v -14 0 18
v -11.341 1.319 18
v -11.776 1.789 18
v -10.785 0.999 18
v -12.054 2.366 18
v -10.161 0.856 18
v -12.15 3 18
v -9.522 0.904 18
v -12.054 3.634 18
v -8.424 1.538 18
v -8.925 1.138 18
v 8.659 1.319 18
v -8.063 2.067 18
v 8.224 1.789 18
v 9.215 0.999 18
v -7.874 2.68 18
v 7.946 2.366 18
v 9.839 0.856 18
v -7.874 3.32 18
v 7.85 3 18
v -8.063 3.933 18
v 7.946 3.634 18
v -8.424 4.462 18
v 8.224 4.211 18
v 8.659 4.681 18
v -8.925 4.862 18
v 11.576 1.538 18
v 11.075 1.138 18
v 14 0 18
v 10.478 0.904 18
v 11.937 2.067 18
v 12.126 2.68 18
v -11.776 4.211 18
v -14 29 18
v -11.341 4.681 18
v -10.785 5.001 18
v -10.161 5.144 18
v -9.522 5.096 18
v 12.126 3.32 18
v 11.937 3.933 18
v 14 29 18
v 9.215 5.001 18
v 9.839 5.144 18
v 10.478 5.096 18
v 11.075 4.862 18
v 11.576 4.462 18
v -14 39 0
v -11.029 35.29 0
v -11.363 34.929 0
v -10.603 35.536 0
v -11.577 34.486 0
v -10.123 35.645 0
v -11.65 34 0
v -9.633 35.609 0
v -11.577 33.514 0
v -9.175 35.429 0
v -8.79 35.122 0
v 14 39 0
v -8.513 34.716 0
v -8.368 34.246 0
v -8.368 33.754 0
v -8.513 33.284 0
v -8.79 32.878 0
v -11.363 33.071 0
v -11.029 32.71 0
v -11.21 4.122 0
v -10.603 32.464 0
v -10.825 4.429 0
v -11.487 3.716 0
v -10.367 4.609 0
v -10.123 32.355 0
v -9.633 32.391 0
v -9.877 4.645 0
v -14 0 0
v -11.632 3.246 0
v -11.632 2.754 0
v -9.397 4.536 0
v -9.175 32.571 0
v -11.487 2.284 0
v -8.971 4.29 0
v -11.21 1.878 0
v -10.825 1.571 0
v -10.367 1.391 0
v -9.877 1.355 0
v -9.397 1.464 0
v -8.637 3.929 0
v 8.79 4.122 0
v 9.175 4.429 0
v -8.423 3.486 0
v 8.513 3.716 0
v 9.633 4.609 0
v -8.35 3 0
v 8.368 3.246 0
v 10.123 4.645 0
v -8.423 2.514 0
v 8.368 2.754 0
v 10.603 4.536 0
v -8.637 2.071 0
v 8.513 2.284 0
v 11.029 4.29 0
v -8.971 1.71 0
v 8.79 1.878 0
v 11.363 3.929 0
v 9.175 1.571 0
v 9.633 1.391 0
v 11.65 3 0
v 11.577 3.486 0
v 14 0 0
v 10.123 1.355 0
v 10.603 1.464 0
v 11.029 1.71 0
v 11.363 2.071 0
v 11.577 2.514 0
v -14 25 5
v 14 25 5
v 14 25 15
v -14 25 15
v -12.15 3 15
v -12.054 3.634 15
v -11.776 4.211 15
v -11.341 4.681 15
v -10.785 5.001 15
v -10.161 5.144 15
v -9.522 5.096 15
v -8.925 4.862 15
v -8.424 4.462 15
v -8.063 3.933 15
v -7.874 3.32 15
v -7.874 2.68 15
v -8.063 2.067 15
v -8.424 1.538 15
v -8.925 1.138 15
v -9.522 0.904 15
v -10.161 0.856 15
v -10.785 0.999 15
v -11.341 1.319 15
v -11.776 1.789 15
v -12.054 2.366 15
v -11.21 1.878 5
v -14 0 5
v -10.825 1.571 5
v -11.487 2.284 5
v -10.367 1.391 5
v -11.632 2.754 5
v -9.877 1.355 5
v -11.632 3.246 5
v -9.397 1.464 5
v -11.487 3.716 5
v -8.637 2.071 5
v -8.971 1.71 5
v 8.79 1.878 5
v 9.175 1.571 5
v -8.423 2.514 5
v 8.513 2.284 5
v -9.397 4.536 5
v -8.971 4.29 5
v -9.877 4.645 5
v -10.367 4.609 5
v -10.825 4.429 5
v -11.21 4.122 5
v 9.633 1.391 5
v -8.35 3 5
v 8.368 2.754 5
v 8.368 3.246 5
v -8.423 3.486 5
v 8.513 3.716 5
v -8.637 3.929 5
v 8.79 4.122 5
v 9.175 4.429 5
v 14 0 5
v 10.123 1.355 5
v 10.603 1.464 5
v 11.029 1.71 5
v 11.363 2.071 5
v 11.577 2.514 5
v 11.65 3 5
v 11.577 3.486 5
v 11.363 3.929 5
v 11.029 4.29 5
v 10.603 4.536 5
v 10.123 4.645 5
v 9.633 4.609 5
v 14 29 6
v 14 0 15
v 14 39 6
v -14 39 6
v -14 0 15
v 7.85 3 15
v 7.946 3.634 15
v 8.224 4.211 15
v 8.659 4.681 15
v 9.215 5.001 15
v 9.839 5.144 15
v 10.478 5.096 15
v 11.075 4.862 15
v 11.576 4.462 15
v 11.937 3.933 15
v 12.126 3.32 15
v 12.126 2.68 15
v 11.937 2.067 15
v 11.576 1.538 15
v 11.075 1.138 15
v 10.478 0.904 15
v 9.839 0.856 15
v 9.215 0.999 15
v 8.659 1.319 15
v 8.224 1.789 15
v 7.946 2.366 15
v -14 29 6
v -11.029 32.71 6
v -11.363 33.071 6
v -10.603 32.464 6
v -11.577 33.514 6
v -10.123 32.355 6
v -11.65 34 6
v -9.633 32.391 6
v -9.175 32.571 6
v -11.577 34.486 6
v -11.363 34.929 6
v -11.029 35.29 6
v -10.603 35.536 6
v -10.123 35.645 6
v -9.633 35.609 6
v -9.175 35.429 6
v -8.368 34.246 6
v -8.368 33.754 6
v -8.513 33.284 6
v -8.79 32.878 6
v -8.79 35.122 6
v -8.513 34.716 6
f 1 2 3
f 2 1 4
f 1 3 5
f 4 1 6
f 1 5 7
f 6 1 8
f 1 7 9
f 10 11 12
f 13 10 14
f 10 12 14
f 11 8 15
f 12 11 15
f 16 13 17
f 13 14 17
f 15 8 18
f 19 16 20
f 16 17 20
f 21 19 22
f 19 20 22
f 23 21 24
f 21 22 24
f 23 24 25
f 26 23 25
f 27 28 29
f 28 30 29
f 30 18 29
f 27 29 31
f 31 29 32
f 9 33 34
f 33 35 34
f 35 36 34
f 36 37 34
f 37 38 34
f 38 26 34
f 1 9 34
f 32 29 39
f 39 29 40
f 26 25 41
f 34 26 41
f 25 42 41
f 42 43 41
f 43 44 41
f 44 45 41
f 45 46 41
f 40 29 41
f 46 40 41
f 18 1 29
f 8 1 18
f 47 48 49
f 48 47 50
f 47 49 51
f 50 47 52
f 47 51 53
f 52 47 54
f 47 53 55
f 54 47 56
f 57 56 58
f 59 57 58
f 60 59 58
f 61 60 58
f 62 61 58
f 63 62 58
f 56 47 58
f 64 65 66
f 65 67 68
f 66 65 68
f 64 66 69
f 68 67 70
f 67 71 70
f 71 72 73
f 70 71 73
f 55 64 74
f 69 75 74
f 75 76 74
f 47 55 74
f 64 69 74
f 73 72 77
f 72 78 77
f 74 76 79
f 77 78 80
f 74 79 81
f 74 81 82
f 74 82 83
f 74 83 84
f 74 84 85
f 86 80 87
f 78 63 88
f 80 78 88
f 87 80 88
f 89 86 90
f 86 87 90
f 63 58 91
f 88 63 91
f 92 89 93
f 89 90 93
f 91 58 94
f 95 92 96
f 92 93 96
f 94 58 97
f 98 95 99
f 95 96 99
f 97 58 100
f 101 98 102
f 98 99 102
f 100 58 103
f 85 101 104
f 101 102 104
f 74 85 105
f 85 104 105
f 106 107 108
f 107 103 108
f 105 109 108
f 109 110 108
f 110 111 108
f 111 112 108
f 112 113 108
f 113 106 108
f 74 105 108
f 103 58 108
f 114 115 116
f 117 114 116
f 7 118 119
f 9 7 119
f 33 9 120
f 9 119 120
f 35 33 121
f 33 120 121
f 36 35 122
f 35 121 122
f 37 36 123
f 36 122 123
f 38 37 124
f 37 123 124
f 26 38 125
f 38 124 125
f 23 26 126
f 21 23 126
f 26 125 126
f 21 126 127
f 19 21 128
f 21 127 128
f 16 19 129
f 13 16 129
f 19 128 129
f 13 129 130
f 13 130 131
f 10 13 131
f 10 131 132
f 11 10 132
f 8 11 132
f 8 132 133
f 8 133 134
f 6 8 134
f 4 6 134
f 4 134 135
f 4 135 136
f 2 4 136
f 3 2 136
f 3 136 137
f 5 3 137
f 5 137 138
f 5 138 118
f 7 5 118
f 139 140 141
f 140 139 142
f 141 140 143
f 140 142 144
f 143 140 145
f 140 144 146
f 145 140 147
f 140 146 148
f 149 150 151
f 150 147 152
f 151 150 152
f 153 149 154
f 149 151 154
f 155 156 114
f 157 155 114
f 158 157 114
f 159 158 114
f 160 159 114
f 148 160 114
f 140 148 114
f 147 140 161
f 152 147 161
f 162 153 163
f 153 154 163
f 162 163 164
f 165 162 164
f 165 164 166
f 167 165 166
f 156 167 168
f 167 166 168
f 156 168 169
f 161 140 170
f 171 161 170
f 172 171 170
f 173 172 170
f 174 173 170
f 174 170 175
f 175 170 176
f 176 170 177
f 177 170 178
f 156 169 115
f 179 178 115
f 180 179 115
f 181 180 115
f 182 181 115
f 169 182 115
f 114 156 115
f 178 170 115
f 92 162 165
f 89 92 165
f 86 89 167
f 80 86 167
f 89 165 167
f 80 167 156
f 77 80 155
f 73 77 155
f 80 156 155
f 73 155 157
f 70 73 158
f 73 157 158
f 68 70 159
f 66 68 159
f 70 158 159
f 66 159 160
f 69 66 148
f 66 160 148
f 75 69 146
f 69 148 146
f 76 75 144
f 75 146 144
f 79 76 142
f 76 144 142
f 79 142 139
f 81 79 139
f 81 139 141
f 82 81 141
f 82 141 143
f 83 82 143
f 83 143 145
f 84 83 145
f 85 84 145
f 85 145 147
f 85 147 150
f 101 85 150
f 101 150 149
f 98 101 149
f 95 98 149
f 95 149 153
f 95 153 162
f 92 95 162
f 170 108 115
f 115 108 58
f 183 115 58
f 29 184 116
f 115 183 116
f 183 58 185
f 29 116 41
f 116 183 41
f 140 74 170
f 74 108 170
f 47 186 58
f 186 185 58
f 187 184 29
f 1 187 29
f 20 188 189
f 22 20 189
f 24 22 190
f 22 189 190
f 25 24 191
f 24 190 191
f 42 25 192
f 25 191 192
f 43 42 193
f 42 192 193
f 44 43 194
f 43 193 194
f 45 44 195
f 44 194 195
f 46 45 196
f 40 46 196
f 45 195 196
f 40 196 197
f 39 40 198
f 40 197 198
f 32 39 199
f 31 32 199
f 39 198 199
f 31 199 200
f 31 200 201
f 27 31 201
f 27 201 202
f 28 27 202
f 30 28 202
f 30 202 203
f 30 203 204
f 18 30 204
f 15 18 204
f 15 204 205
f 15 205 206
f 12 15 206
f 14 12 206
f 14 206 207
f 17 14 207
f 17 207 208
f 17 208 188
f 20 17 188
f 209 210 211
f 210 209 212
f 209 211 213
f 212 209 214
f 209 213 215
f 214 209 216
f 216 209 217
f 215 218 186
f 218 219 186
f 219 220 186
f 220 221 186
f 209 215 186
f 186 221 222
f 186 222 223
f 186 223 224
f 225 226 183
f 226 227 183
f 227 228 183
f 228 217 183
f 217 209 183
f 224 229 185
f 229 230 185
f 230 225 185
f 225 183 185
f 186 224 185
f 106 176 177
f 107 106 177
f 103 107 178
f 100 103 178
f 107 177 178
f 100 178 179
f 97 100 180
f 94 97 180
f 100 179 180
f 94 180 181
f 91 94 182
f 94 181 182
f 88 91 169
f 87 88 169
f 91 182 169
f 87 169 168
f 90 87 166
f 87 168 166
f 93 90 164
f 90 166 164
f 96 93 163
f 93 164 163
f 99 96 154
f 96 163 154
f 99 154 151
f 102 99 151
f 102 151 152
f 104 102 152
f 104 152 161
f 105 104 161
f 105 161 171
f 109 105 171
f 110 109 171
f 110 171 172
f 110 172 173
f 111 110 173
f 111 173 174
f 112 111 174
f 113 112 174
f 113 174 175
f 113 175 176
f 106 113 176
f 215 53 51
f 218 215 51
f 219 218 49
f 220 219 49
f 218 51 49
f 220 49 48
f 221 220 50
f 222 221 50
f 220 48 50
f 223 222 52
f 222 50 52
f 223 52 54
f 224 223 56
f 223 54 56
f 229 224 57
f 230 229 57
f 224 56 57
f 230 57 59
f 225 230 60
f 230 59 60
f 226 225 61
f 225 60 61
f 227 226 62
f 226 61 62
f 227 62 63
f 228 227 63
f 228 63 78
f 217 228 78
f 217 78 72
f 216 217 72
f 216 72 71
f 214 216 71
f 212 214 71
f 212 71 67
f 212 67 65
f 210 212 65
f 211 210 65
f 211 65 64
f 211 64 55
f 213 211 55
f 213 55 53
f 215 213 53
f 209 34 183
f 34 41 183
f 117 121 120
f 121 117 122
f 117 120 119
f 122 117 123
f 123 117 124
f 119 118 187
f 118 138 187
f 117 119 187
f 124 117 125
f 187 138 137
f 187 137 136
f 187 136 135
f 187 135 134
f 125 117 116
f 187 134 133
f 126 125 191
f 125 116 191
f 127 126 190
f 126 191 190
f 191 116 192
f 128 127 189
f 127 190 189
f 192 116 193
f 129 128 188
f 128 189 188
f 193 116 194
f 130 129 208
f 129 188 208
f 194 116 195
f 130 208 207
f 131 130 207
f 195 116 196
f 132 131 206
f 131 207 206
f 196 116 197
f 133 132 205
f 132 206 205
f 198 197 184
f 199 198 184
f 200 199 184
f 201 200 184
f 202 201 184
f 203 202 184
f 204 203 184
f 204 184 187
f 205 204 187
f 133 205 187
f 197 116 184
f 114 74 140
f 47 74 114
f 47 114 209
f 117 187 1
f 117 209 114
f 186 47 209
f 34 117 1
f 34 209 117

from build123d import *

# Parameters (mm, degrees)
EXTRUDE_1_DEPTH          = 14
HOLE_WIZARD_M4_1_D       = 3.3
HOLE_WIZARD_M4_2_D       = 3.3
HOLE_WIZARD_M4_2_DEPTH   = 5
HOLE_WIZARD_M4_1_2_D     = 4.3
HOLE_WIZARD_M4_1_2_DEPTH = 3


with BuildPart() as part:
    # 草图2 → 凸台-拉伸1 (new, symmetric)
    with BuildSketch(Plane(origin=(0, 0, 0), x_dir=(0, 0, -1), z_dir=(1, 0, 0))):
        Polygon((-15, 0), (-18, 0), (-18, 29), (-6, 29), (-6, 39), (0, 39), (0, 0), (-5, 0), (-5, 25), (-15, 25), align=None)
    extrude(amount=EXTRUDE_1_DEPTH, both=True)

    # Hole Wizard M4 _1 (through all)
    with Locations(Plane.XY.offset(6)):
        with Locations((-10, 34)):
            Hole(HOLE_WIZARD_M4_1_D / 2)

    # M4 螺纹孔2
    with Locations(Plane(origin=(0, 0, 0), x_dir=(-1, 0, 0), z_dir=(0, 0, -1))):
        with Locations((10, 3), (-10, 3)):
            Hole(HOLE_WIZARD_M4_2_D / 2, depth=HOLE_WIZARD_M4_2_DEPTH)

    # Hole Wizard M4 _1 2
    with Locations(Plane.XY.offset(18)):
        with Locations((-10, 3), (10, 3)):
            Hole(HOLE_WIZARD_M4_1_2_D / 2, depth=HOLE_WIZARD_M4_1_2_DEPTH)


solid = part.part
